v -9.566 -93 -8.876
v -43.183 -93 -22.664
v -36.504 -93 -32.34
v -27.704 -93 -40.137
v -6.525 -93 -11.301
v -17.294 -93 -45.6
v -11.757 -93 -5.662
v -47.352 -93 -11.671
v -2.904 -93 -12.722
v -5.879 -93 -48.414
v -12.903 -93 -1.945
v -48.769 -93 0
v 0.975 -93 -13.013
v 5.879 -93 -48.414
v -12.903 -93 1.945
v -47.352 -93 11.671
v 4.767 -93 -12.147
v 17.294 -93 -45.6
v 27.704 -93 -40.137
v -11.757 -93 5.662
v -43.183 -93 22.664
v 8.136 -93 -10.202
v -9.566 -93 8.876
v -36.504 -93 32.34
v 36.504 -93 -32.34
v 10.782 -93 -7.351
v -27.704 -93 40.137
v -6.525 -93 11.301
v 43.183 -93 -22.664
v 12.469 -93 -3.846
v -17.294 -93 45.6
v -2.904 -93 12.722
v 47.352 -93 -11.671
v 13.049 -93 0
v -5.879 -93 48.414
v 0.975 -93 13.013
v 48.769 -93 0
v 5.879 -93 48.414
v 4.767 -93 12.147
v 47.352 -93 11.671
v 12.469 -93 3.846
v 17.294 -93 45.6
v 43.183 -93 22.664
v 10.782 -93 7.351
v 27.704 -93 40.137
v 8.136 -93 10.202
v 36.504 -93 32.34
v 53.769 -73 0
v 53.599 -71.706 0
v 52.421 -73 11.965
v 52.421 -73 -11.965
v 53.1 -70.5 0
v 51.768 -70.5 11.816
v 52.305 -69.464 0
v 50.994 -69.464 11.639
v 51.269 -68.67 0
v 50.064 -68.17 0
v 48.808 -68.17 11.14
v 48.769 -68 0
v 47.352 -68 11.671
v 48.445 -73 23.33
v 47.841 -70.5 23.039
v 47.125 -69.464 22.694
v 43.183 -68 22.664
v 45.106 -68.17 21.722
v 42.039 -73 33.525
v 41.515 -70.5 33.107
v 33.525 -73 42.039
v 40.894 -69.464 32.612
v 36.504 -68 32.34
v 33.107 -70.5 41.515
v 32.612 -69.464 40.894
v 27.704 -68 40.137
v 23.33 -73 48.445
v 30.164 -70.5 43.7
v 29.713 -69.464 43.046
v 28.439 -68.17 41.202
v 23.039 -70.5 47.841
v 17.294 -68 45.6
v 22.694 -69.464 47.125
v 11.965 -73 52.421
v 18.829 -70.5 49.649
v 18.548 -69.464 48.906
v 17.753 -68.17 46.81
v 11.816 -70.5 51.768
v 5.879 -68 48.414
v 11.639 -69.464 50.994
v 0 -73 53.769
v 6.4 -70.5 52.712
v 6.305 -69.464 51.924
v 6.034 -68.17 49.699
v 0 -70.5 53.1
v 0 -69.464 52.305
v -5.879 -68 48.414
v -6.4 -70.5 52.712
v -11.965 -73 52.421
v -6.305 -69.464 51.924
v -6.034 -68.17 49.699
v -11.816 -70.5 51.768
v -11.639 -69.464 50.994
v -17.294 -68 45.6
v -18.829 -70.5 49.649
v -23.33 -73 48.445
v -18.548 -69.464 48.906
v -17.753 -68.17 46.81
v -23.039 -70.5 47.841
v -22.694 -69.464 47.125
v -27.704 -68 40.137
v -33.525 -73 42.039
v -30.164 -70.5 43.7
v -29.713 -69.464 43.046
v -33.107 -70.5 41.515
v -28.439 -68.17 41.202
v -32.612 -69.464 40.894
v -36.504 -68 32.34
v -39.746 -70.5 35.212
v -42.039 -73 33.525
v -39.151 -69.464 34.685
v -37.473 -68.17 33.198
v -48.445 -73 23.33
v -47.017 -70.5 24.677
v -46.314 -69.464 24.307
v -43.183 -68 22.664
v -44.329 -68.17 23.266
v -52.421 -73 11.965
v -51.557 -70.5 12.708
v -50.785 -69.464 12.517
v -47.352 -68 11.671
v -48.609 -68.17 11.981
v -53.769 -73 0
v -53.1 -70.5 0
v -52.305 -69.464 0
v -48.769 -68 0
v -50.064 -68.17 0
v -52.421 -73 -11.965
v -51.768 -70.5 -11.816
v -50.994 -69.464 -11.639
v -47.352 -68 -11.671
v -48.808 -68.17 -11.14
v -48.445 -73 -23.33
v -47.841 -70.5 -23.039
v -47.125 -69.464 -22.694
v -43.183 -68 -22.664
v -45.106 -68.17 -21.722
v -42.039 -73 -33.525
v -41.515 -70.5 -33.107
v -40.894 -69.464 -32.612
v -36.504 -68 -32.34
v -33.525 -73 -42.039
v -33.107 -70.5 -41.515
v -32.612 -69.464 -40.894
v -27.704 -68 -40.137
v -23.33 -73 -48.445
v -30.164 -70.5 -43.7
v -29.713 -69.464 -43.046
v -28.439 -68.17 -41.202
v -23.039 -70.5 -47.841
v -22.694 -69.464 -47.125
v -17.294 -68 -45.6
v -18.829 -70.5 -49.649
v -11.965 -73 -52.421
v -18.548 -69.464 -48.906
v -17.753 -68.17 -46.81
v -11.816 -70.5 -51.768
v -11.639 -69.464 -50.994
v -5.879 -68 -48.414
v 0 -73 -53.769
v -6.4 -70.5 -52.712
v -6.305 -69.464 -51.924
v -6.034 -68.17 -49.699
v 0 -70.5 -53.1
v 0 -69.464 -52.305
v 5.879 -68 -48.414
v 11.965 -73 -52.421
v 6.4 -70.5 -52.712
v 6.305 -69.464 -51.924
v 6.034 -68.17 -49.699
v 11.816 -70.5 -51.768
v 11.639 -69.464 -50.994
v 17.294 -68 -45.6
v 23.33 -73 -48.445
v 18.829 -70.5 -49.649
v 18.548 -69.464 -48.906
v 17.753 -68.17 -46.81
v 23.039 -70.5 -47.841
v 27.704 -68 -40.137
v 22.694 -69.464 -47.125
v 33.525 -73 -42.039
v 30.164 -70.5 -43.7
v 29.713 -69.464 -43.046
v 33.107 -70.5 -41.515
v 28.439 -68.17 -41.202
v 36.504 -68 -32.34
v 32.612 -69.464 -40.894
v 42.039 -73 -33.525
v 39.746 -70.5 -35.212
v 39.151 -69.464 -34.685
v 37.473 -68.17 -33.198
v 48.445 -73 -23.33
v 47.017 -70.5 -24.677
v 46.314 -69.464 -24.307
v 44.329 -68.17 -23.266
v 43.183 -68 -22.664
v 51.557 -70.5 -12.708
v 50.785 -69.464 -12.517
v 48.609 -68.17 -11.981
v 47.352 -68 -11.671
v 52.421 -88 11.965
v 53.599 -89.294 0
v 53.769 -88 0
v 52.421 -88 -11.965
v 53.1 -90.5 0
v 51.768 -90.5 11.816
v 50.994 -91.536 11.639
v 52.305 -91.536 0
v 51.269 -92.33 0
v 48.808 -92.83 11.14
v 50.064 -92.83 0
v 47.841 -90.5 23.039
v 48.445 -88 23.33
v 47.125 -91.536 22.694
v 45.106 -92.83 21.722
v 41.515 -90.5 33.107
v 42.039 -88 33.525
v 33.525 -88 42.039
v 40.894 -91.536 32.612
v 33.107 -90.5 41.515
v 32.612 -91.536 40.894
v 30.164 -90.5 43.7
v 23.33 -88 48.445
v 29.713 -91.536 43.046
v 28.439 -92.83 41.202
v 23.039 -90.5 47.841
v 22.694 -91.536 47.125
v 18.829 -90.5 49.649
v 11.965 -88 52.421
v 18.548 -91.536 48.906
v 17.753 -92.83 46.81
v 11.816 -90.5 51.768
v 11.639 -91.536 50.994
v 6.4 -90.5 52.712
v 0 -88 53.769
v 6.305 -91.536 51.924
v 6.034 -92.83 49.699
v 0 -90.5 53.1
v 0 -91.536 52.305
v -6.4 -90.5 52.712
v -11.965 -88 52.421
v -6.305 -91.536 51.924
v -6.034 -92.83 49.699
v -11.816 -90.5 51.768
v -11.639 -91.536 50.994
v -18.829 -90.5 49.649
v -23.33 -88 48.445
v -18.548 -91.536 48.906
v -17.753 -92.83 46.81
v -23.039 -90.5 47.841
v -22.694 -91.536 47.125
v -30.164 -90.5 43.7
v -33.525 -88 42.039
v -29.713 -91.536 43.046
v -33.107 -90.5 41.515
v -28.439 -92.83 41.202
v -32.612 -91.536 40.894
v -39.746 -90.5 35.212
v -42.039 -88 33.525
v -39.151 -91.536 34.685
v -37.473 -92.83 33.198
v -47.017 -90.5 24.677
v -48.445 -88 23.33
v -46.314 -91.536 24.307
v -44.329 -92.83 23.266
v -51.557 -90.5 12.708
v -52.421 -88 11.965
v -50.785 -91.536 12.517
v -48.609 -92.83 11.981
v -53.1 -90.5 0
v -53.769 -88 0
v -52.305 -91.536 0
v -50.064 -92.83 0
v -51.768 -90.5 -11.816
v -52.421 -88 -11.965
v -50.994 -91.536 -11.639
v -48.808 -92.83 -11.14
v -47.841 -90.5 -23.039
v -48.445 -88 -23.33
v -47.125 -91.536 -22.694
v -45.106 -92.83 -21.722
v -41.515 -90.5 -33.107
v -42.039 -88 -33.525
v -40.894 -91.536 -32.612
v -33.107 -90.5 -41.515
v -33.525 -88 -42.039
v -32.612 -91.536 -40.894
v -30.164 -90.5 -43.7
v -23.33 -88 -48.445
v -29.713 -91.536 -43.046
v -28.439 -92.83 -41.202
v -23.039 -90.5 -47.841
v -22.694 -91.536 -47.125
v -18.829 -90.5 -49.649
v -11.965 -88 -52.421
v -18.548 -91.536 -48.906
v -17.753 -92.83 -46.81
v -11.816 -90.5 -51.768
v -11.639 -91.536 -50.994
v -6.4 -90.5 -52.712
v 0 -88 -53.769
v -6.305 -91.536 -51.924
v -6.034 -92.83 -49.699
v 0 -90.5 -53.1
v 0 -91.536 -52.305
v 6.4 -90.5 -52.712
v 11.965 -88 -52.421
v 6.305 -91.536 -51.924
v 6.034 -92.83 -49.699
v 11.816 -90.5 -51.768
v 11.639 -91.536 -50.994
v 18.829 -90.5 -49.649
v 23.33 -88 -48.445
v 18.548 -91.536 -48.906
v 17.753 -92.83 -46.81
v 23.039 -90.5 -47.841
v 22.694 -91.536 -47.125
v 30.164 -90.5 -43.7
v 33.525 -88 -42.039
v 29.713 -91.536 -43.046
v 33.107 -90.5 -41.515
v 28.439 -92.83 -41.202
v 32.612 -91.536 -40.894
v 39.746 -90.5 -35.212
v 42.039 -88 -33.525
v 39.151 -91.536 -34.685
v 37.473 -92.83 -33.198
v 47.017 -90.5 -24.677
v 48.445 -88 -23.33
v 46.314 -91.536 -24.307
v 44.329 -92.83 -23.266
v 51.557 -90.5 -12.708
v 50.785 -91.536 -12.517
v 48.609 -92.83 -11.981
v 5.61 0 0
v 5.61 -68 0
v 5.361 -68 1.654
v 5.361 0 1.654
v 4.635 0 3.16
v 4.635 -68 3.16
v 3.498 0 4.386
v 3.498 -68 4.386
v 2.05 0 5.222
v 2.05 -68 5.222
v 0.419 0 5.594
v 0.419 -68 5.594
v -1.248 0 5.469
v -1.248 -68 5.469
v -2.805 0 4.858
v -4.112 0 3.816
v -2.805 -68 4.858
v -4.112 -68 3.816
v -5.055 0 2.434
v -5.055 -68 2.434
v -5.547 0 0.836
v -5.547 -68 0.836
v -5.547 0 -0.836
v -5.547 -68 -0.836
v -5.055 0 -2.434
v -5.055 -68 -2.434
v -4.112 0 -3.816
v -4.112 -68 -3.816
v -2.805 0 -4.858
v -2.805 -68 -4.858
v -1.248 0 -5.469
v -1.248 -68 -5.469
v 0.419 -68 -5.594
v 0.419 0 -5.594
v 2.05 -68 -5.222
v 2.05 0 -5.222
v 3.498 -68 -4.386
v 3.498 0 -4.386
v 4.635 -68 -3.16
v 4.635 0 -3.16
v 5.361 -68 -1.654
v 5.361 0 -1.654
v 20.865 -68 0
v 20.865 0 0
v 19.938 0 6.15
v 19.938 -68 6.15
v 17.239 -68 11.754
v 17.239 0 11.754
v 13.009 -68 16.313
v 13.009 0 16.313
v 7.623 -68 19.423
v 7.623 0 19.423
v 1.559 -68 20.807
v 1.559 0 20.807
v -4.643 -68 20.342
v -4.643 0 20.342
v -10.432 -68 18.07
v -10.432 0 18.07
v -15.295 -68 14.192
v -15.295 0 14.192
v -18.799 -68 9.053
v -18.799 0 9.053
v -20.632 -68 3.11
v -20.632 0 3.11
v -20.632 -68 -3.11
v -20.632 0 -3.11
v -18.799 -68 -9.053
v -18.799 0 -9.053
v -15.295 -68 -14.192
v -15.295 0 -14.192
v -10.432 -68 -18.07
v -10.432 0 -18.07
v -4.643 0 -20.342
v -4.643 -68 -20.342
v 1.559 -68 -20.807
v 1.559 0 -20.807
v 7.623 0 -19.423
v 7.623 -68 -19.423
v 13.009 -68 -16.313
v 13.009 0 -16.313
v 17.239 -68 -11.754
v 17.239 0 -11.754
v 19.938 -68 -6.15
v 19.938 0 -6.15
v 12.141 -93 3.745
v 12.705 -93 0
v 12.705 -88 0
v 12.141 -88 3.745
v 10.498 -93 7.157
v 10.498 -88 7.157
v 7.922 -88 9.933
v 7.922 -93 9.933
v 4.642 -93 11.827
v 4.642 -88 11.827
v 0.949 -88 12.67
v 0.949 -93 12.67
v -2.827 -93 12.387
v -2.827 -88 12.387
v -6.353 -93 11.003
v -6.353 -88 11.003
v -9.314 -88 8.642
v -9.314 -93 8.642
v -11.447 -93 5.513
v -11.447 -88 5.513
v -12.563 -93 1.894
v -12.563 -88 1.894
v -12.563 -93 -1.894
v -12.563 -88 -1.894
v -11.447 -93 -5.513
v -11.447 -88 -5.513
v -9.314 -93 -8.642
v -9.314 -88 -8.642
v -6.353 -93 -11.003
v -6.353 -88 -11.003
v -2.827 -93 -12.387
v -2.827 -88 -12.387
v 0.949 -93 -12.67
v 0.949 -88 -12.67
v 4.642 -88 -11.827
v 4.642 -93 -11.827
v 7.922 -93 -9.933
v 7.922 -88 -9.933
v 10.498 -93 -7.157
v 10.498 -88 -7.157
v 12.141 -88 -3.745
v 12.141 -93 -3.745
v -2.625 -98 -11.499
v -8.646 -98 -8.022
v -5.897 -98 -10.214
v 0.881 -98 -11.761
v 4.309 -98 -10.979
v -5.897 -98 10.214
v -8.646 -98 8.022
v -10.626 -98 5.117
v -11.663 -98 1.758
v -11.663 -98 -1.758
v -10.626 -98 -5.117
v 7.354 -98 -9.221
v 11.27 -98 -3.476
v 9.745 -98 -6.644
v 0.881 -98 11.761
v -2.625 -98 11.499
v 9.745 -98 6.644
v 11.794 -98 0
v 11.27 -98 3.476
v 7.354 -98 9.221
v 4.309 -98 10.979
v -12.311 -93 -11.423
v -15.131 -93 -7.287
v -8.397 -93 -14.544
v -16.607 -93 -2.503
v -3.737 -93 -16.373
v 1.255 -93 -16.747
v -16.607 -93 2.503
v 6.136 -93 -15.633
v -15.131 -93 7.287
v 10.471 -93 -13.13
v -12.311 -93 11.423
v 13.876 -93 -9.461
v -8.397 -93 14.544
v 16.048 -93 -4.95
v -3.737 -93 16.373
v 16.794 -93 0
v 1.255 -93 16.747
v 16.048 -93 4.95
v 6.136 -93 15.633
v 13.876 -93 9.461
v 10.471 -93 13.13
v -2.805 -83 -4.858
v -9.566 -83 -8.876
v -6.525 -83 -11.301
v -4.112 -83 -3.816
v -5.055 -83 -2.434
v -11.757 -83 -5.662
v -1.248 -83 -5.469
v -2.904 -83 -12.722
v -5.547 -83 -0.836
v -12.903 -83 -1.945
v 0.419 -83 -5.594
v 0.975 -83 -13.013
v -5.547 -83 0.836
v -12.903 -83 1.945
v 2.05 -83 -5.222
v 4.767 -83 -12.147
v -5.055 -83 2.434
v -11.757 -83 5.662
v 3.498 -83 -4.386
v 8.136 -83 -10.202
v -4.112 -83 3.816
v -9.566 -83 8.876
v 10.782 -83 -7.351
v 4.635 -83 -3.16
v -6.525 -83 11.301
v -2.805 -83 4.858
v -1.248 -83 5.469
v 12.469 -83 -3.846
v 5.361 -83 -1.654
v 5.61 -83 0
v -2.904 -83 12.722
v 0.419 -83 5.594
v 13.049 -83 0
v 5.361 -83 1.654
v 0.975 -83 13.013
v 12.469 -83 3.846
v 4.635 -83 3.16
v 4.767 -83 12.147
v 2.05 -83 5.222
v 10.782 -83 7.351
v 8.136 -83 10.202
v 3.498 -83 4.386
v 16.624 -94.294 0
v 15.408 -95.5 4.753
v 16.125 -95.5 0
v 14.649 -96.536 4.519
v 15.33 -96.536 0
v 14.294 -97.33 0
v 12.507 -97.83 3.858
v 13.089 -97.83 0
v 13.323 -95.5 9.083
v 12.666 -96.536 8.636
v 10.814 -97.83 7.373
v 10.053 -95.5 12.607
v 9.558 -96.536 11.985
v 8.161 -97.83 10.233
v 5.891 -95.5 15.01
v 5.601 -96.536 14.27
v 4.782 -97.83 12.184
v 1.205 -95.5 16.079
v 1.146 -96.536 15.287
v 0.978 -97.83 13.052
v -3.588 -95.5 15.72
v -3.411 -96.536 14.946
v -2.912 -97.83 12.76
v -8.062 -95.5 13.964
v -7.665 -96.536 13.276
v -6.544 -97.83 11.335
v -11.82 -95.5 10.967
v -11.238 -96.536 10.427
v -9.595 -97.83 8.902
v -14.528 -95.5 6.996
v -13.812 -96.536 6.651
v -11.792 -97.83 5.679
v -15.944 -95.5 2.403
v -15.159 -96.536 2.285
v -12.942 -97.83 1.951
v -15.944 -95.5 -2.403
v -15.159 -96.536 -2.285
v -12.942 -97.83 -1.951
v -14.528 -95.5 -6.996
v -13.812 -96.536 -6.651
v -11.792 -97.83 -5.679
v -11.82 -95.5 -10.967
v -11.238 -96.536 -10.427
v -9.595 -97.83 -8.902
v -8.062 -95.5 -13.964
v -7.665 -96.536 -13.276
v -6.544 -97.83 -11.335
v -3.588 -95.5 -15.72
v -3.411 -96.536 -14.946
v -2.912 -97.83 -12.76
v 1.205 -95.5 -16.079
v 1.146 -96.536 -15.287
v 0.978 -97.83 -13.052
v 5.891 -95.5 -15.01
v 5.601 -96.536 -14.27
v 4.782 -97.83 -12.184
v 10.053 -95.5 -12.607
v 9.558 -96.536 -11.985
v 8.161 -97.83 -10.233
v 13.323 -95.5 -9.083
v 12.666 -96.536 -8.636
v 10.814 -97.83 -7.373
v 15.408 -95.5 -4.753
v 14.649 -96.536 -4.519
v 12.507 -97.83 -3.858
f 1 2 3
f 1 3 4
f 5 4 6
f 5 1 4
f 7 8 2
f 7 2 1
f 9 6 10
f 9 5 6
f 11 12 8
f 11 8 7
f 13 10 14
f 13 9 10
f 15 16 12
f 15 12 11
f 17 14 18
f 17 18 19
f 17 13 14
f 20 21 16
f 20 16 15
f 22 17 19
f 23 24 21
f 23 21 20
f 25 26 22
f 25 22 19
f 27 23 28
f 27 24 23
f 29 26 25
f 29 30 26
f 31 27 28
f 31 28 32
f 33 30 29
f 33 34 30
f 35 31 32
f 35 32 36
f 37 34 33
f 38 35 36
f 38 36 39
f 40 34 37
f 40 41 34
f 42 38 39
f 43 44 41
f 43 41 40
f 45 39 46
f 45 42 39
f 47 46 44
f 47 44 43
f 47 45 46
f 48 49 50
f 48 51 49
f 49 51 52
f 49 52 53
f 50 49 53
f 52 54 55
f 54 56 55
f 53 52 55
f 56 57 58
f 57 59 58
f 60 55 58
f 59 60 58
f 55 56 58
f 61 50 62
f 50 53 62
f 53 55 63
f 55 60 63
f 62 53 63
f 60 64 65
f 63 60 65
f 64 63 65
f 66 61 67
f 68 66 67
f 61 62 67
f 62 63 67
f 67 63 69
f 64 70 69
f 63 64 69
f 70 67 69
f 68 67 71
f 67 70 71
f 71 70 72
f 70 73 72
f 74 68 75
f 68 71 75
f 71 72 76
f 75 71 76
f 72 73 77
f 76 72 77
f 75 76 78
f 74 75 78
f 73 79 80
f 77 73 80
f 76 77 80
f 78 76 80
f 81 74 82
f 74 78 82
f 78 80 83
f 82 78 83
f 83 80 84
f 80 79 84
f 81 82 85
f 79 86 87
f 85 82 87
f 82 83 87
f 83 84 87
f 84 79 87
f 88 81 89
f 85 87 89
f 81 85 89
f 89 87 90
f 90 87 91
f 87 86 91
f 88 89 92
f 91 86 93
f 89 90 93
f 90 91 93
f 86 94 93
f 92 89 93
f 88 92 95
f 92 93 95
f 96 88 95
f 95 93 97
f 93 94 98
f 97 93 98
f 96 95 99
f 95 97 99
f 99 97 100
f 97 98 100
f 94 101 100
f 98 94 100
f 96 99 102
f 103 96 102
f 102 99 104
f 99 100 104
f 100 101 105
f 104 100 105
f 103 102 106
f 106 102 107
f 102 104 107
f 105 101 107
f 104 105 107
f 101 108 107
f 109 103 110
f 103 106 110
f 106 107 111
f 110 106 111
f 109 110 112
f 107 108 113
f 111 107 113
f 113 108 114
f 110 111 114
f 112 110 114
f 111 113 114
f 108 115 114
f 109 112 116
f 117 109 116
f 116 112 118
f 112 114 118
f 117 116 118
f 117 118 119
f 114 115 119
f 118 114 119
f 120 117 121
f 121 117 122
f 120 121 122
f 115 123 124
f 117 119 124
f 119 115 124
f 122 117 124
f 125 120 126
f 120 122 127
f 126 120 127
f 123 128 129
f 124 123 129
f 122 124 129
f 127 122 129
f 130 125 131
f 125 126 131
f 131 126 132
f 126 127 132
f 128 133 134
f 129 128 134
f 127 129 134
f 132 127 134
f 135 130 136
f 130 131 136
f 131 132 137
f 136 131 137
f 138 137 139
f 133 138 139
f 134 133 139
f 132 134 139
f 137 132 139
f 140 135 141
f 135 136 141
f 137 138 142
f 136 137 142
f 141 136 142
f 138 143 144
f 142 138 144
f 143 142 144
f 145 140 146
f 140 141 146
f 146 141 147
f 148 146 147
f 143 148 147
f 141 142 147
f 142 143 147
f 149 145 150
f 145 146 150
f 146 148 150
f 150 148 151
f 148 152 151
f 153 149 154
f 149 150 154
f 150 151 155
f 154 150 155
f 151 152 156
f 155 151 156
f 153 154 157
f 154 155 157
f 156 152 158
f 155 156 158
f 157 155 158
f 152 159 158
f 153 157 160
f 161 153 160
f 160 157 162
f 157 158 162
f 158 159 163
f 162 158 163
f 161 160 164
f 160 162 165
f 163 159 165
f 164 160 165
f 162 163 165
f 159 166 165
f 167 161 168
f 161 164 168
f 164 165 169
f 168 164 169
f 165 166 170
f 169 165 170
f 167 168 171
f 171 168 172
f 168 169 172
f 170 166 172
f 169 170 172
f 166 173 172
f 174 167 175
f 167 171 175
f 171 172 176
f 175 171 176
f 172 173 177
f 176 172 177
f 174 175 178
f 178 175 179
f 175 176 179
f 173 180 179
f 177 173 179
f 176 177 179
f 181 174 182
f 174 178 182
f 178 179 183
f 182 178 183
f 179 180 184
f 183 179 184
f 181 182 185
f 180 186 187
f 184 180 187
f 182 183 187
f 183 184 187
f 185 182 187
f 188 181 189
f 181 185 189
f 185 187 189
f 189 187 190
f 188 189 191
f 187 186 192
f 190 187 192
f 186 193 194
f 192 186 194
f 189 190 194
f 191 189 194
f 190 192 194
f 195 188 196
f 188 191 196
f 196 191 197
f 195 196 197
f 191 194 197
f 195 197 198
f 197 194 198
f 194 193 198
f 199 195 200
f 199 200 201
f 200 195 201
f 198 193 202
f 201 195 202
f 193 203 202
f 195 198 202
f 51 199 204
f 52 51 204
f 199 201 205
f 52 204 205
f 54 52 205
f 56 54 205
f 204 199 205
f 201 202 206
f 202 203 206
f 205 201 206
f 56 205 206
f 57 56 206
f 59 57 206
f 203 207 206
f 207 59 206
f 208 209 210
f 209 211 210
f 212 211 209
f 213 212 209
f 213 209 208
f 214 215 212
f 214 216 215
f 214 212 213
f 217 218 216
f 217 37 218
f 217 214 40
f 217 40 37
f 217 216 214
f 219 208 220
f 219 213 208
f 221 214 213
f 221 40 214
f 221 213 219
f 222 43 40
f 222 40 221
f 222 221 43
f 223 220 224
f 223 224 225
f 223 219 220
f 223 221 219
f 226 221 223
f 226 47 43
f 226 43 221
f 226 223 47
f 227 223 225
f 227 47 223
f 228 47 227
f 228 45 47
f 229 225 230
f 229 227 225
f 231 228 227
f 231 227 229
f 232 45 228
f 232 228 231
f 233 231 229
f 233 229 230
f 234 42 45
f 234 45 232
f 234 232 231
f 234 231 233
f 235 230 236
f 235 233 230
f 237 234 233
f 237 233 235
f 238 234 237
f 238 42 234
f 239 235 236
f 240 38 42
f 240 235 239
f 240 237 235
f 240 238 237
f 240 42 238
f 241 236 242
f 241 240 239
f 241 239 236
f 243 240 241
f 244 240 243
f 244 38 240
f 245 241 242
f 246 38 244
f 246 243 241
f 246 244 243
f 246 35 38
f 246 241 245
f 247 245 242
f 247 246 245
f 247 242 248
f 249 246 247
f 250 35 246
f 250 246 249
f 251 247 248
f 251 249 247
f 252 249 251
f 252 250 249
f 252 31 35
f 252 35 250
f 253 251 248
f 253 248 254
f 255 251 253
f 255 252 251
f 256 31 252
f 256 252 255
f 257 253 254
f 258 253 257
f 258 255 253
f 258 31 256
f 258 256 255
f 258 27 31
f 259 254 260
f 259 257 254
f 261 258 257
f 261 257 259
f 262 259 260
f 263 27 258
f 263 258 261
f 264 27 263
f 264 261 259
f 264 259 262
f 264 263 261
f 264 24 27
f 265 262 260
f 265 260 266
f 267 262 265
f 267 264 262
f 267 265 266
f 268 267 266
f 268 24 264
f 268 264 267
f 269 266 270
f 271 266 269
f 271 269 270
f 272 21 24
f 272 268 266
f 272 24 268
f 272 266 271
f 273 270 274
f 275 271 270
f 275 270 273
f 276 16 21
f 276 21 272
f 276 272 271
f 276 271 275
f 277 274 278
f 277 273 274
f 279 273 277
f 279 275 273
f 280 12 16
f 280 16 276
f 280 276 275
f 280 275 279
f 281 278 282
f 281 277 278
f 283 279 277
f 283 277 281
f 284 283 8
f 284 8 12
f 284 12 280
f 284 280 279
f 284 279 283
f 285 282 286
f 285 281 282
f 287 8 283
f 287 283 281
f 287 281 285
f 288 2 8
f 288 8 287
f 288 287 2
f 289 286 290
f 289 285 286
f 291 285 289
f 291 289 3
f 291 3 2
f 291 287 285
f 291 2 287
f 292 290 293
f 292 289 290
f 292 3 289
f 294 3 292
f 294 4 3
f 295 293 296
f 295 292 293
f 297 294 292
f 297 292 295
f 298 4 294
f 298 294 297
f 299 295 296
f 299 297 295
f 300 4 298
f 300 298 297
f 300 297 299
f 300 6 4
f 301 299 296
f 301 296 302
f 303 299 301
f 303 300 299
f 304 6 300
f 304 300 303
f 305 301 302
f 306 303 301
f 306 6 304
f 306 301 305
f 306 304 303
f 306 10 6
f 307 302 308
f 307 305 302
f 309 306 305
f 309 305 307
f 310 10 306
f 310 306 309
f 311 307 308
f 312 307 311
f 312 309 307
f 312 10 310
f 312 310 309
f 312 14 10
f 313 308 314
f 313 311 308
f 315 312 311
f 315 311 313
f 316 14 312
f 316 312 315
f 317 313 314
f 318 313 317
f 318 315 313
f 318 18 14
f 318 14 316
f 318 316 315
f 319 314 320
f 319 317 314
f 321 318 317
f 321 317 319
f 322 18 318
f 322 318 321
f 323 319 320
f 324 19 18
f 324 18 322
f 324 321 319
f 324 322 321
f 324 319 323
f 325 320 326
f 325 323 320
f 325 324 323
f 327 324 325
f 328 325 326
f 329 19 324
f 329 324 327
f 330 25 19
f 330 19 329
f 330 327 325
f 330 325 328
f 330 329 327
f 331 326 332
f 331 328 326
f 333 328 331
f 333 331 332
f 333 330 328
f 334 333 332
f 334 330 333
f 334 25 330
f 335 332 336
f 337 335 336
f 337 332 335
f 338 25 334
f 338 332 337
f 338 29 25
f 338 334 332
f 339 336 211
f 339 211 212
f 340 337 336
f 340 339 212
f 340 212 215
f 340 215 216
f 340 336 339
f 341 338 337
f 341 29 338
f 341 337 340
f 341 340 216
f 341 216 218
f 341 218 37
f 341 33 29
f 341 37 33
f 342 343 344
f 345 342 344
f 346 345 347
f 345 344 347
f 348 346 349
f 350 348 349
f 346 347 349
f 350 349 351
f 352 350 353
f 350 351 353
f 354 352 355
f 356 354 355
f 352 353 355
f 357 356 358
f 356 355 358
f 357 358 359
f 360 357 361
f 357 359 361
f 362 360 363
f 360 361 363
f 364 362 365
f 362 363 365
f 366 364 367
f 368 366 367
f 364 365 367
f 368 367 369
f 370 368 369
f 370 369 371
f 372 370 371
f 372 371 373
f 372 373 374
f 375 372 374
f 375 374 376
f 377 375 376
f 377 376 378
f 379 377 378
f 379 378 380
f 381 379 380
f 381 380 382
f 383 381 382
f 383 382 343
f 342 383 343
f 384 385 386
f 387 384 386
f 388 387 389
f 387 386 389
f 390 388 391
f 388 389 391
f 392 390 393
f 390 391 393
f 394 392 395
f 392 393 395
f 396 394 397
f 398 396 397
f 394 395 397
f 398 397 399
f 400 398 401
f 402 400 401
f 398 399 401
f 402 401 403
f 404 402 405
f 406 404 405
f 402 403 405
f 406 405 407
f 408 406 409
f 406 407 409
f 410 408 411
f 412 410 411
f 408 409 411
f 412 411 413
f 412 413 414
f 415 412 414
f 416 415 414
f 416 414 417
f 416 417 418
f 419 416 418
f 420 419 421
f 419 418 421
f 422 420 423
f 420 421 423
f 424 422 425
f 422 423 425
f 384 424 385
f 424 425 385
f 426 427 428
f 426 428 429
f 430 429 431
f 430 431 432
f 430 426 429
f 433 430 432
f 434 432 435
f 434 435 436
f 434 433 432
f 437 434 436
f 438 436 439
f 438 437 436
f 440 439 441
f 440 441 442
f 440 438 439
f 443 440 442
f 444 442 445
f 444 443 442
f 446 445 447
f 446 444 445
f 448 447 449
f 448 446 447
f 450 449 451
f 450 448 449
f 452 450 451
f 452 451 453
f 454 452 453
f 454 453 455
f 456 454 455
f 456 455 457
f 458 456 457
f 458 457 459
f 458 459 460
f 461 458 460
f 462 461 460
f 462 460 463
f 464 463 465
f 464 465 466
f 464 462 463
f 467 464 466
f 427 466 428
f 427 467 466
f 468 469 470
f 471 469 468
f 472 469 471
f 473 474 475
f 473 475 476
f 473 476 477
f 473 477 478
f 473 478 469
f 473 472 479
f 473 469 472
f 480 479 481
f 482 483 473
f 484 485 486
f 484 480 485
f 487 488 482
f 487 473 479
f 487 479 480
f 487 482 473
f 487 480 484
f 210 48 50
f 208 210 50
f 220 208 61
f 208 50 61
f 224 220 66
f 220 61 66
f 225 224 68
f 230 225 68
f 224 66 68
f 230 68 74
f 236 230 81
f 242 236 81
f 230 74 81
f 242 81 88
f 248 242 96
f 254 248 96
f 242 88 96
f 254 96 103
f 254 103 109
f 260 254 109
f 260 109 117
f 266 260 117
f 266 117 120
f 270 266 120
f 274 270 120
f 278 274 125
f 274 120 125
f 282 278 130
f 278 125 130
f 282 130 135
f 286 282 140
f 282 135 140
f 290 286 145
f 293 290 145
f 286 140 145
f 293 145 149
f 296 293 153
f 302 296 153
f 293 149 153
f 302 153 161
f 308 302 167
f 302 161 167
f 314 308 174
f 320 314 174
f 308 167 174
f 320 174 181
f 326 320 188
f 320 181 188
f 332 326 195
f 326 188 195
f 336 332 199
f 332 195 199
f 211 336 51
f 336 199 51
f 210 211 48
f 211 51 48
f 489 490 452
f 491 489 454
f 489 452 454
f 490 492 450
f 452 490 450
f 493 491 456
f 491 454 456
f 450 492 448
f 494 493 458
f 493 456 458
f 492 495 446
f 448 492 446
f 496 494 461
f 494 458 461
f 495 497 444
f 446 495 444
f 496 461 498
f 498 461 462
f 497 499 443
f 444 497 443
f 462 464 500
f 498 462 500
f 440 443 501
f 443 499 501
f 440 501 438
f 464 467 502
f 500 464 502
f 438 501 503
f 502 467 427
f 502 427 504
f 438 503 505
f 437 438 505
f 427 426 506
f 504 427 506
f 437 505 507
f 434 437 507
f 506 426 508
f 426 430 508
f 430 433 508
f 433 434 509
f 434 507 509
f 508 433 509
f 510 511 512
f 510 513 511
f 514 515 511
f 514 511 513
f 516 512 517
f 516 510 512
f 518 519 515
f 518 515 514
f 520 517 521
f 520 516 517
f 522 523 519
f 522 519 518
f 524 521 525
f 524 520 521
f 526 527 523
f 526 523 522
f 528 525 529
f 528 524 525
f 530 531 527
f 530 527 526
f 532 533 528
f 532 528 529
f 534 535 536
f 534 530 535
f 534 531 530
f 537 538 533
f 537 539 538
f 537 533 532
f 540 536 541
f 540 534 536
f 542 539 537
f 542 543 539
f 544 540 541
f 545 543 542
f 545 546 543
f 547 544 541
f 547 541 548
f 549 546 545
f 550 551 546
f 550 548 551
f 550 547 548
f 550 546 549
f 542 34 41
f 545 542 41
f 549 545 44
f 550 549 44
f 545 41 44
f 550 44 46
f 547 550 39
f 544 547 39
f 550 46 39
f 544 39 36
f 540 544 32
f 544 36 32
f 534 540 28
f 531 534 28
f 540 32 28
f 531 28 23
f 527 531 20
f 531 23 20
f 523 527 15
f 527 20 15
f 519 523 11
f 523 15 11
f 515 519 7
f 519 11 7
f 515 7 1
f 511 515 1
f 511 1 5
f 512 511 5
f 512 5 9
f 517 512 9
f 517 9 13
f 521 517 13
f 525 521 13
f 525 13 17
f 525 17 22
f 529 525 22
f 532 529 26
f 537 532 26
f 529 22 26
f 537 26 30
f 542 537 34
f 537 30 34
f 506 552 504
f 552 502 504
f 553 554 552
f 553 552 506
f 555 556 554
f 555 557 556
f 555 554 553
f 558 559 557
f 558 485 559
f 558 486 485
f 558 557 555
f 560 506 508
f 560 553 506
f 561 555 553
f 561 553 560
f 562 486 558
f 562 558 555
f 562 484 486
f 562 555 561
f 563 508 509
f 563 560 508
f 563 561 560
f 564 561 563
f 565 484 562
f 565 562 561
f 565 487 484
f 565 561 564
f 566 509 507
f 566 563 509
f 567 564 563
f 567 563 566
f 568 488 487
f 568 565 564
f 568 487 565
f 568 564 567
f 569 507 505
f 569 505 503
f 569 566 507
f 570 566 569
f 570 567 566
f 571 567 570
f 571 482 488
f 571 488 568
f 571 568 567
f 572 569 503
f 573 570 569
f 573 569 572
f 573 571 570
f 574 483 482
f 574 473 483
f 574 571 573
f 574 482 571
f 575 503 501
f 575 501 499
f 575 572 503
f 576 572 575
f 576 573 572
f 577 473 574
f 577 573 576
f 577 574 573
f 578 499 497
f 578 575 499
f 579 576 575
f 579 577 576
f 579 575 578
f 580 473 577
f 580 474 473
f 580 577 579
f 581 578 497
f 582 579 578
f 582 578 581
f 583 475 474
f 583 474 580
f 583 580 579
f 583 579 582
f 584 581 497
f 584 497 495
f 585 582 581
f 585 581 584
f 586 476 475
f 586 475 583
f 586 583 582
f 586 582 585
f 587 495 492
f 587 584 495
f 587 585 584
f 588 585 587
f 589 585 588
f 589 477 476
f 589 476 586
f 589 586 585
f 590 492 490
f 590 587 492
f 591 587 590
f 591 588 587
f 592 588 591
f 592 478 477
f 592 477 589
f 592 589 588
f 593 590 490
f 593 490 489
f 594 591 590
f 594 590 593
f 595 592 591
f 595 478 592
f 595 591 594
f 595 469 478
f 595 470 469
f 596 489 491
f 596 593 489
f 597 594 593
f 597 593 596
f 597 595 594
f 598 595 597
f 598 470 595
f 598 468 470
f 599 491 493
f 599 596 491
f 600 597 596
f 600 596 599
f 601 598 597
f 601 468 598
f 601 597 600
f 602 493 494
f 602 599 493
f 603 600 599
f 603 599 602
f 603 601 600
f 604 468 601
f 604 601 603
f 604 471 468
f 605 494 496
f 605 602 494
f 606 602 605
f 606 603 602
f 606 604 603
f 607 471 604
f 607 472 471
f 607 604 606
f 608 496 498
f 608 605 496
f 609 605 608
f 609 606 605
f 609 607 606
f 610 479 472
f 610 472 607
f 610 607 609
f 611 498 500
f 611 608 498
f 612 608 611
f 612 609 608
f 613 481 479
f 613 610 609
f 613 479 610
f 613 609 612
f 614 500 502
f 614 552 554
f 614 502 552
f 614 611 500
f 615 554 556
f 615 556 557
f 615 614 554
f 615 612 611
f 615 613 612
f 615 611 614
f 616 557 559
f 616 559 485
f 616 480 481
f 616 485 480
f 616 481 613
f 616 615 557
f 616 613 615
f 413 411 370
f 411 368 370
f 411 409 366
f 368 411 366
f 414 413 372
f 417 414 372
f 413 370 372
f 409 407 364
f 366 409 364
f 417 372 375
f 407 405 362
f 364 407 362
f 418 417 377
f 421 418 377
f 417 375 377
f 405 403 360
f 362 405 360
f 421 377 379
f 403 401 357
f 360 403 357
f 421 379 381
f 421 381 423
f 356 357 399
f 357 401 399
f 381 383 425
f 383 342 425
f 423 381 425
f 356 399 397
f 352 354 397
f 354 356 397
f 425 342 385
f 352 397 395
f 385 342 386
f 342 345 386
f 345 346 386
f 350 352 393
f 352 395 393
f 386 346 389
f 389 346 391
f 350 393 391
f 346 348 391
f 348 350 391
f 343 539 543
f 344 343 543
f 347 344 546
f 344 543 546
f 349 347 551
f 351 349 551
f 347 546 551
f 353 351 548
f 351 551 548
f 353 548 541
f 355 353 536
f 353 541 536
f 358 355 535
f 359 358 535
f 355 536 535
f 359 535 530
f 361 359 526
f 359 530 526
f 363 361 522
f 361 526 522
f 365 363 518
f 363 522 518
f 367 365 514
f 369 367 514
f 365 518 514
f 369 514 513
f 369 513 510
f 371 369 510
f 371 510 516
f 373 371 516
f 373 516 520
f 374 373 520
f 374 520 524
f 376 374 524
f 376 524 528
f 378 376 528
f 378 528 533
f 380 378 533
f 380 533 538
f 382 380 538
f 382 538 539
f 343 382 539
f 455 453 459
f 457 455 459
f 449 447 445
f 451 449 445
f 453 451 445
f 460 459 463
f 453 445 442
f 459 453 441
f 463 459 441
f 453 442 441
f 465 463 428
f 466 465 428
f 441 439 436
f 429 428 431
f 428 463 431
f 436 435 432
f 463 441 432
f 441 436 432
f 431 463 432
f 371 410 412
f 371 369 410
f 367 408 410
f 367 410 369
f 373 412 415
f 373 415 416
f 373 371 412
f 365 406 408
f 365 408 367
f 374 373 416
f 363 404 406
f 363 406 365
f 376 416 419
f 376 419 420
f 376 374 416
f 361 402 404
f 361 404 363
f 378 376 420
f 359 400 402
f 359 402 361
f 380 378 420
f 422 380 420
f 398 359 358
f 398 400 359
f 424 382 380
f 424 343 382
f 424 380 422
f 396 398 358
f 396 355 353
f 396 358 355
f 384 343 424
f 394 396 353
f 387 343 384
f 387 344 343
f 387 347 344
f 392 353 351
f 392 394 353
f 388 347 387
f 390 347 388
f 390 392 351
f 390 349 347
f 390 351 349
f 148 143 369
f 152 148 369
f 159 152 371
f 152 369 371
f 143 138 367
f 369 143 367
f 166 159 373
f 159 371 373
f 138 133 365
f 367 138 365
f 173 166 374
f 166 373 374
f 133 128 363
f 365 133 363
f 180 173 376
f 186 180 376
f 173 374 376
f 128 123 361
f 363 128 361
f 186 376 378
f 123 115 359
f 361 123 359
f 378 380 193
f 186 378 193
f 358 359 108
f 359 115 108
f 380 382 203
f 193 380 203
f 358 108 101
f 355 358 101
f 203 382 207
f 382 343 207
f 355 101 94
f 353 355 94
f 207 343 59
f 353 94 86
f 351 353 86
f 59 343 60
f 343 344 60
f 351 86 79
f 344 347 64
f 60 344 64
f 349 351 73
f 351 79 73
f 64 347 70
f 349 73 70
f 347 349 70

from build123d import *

# Parameters (mm, degrees)
F0_R      = 20.8649821503
F1_DEPTH  = 68
F2_R      = 53.7694879876
F2_R_2    = 20.8649821503
F3_DEPTH  = 25
F4_R      = 5.6100913923
F5_DEPTH  = 93.001
F7_R      = 5
F8_R      = 13.049224489
F8_R_2    = 5.6100913923
F9_DEPTH  = 10
F10_R     = 12.7052996832
F11_DEPTH = 5
F10_R_2   = 16.7944070529
F10_R_3   = 13.049224489
F12_DEPTH = 5
F13_R     = 4.99999


# Not quite as in the source:
# - a fillet or chamfer is up to 0.001 mm smaller than in the source, because OpenCascade refuses the exact size


with BuildPart() as f1:
    # F0 (on Front) → F1 (new body)
    with BuildSketch(Plane.XZ):
        Circle(F0_R)
    extrude(amount=F1_DEPTH)


with BuildPart() as f3:
    # F2 (on face) → F3 (new body)
    with BuildSketch(Plane.XZ.offset(68)):
        Circle(F2_R)
        Circle(F2_R_2, mode=Mode.SUBTRACT)
        Circle(F2_R_2)
    extrude(amount=F3_DEPTH)


with BuildPart() as f5:
    # F4 (on face) → F5 (new body, through all)
    with BuildSketch(Plane.XZ.offset(93)):
        Circle(F4_R)
    extrude(amount=-F5_DEPTH)


with BuildPart() as f1_1:
    add(f1.part)

    # F6: cut F5
    add(f5.part, mode=Mode.SUBTRACT)


with BuildPart() as f3_1:
    add(f3.part)

    # F6: cut F5
    add(f5.part, mode=Mode.SUBTRACT)

    # F7
    f7_edges = [f3_1.edges().sort_by_distance(p)[0] for p in [
        (-53.769488, -93, 0),
        (-53.769488, -68, 0),
    ]]
    fillet(f7_edges, radius=F7_R)

    # F8 (on face) → F9 (cut)
    with BuildSketch(Plane.XZ.offset(93)):
        Circle(F8_R)
        Circle(F8_R_2, mode=Mode.SUBTRACT)
    extrude(amount=-F9_DEPTH, mode=Mode.SUBTRACT)


with BuildPart() as f11:
    # F10 (on face) → F11 (new body)
    with BuildSketch(Plane.XZ.offset(93)):
        Circle(F10_R)
    extrude(amount=-F11_DEPTH)

    # F10 (on face) → F12 (join)
    with BuildSketch(Plane.XZ.offset(93)):
        Circle(F10_R_2)
        Circle(F10_R_3, mode=Mode.SUBTRACT)
        Circle(F10_R_3)
        Circle(F10_R, mode=Mode.SUBTRACT)
        Circle(F10_R)
    extrude(amount=F12_DEPTH)

    # F13 (radius 5 in the source; OpenCascade refuses exactly that, so slightly less here)
    f13_edges = [f11.edges().sort_by_distance(p)[0] for p in [
        (-16.794407, -98, 0),
    ]]
    fillet(f13_edges, radius=F13_R)


solid = Compound([f1_1.part, f3_1.part, f11.part])
